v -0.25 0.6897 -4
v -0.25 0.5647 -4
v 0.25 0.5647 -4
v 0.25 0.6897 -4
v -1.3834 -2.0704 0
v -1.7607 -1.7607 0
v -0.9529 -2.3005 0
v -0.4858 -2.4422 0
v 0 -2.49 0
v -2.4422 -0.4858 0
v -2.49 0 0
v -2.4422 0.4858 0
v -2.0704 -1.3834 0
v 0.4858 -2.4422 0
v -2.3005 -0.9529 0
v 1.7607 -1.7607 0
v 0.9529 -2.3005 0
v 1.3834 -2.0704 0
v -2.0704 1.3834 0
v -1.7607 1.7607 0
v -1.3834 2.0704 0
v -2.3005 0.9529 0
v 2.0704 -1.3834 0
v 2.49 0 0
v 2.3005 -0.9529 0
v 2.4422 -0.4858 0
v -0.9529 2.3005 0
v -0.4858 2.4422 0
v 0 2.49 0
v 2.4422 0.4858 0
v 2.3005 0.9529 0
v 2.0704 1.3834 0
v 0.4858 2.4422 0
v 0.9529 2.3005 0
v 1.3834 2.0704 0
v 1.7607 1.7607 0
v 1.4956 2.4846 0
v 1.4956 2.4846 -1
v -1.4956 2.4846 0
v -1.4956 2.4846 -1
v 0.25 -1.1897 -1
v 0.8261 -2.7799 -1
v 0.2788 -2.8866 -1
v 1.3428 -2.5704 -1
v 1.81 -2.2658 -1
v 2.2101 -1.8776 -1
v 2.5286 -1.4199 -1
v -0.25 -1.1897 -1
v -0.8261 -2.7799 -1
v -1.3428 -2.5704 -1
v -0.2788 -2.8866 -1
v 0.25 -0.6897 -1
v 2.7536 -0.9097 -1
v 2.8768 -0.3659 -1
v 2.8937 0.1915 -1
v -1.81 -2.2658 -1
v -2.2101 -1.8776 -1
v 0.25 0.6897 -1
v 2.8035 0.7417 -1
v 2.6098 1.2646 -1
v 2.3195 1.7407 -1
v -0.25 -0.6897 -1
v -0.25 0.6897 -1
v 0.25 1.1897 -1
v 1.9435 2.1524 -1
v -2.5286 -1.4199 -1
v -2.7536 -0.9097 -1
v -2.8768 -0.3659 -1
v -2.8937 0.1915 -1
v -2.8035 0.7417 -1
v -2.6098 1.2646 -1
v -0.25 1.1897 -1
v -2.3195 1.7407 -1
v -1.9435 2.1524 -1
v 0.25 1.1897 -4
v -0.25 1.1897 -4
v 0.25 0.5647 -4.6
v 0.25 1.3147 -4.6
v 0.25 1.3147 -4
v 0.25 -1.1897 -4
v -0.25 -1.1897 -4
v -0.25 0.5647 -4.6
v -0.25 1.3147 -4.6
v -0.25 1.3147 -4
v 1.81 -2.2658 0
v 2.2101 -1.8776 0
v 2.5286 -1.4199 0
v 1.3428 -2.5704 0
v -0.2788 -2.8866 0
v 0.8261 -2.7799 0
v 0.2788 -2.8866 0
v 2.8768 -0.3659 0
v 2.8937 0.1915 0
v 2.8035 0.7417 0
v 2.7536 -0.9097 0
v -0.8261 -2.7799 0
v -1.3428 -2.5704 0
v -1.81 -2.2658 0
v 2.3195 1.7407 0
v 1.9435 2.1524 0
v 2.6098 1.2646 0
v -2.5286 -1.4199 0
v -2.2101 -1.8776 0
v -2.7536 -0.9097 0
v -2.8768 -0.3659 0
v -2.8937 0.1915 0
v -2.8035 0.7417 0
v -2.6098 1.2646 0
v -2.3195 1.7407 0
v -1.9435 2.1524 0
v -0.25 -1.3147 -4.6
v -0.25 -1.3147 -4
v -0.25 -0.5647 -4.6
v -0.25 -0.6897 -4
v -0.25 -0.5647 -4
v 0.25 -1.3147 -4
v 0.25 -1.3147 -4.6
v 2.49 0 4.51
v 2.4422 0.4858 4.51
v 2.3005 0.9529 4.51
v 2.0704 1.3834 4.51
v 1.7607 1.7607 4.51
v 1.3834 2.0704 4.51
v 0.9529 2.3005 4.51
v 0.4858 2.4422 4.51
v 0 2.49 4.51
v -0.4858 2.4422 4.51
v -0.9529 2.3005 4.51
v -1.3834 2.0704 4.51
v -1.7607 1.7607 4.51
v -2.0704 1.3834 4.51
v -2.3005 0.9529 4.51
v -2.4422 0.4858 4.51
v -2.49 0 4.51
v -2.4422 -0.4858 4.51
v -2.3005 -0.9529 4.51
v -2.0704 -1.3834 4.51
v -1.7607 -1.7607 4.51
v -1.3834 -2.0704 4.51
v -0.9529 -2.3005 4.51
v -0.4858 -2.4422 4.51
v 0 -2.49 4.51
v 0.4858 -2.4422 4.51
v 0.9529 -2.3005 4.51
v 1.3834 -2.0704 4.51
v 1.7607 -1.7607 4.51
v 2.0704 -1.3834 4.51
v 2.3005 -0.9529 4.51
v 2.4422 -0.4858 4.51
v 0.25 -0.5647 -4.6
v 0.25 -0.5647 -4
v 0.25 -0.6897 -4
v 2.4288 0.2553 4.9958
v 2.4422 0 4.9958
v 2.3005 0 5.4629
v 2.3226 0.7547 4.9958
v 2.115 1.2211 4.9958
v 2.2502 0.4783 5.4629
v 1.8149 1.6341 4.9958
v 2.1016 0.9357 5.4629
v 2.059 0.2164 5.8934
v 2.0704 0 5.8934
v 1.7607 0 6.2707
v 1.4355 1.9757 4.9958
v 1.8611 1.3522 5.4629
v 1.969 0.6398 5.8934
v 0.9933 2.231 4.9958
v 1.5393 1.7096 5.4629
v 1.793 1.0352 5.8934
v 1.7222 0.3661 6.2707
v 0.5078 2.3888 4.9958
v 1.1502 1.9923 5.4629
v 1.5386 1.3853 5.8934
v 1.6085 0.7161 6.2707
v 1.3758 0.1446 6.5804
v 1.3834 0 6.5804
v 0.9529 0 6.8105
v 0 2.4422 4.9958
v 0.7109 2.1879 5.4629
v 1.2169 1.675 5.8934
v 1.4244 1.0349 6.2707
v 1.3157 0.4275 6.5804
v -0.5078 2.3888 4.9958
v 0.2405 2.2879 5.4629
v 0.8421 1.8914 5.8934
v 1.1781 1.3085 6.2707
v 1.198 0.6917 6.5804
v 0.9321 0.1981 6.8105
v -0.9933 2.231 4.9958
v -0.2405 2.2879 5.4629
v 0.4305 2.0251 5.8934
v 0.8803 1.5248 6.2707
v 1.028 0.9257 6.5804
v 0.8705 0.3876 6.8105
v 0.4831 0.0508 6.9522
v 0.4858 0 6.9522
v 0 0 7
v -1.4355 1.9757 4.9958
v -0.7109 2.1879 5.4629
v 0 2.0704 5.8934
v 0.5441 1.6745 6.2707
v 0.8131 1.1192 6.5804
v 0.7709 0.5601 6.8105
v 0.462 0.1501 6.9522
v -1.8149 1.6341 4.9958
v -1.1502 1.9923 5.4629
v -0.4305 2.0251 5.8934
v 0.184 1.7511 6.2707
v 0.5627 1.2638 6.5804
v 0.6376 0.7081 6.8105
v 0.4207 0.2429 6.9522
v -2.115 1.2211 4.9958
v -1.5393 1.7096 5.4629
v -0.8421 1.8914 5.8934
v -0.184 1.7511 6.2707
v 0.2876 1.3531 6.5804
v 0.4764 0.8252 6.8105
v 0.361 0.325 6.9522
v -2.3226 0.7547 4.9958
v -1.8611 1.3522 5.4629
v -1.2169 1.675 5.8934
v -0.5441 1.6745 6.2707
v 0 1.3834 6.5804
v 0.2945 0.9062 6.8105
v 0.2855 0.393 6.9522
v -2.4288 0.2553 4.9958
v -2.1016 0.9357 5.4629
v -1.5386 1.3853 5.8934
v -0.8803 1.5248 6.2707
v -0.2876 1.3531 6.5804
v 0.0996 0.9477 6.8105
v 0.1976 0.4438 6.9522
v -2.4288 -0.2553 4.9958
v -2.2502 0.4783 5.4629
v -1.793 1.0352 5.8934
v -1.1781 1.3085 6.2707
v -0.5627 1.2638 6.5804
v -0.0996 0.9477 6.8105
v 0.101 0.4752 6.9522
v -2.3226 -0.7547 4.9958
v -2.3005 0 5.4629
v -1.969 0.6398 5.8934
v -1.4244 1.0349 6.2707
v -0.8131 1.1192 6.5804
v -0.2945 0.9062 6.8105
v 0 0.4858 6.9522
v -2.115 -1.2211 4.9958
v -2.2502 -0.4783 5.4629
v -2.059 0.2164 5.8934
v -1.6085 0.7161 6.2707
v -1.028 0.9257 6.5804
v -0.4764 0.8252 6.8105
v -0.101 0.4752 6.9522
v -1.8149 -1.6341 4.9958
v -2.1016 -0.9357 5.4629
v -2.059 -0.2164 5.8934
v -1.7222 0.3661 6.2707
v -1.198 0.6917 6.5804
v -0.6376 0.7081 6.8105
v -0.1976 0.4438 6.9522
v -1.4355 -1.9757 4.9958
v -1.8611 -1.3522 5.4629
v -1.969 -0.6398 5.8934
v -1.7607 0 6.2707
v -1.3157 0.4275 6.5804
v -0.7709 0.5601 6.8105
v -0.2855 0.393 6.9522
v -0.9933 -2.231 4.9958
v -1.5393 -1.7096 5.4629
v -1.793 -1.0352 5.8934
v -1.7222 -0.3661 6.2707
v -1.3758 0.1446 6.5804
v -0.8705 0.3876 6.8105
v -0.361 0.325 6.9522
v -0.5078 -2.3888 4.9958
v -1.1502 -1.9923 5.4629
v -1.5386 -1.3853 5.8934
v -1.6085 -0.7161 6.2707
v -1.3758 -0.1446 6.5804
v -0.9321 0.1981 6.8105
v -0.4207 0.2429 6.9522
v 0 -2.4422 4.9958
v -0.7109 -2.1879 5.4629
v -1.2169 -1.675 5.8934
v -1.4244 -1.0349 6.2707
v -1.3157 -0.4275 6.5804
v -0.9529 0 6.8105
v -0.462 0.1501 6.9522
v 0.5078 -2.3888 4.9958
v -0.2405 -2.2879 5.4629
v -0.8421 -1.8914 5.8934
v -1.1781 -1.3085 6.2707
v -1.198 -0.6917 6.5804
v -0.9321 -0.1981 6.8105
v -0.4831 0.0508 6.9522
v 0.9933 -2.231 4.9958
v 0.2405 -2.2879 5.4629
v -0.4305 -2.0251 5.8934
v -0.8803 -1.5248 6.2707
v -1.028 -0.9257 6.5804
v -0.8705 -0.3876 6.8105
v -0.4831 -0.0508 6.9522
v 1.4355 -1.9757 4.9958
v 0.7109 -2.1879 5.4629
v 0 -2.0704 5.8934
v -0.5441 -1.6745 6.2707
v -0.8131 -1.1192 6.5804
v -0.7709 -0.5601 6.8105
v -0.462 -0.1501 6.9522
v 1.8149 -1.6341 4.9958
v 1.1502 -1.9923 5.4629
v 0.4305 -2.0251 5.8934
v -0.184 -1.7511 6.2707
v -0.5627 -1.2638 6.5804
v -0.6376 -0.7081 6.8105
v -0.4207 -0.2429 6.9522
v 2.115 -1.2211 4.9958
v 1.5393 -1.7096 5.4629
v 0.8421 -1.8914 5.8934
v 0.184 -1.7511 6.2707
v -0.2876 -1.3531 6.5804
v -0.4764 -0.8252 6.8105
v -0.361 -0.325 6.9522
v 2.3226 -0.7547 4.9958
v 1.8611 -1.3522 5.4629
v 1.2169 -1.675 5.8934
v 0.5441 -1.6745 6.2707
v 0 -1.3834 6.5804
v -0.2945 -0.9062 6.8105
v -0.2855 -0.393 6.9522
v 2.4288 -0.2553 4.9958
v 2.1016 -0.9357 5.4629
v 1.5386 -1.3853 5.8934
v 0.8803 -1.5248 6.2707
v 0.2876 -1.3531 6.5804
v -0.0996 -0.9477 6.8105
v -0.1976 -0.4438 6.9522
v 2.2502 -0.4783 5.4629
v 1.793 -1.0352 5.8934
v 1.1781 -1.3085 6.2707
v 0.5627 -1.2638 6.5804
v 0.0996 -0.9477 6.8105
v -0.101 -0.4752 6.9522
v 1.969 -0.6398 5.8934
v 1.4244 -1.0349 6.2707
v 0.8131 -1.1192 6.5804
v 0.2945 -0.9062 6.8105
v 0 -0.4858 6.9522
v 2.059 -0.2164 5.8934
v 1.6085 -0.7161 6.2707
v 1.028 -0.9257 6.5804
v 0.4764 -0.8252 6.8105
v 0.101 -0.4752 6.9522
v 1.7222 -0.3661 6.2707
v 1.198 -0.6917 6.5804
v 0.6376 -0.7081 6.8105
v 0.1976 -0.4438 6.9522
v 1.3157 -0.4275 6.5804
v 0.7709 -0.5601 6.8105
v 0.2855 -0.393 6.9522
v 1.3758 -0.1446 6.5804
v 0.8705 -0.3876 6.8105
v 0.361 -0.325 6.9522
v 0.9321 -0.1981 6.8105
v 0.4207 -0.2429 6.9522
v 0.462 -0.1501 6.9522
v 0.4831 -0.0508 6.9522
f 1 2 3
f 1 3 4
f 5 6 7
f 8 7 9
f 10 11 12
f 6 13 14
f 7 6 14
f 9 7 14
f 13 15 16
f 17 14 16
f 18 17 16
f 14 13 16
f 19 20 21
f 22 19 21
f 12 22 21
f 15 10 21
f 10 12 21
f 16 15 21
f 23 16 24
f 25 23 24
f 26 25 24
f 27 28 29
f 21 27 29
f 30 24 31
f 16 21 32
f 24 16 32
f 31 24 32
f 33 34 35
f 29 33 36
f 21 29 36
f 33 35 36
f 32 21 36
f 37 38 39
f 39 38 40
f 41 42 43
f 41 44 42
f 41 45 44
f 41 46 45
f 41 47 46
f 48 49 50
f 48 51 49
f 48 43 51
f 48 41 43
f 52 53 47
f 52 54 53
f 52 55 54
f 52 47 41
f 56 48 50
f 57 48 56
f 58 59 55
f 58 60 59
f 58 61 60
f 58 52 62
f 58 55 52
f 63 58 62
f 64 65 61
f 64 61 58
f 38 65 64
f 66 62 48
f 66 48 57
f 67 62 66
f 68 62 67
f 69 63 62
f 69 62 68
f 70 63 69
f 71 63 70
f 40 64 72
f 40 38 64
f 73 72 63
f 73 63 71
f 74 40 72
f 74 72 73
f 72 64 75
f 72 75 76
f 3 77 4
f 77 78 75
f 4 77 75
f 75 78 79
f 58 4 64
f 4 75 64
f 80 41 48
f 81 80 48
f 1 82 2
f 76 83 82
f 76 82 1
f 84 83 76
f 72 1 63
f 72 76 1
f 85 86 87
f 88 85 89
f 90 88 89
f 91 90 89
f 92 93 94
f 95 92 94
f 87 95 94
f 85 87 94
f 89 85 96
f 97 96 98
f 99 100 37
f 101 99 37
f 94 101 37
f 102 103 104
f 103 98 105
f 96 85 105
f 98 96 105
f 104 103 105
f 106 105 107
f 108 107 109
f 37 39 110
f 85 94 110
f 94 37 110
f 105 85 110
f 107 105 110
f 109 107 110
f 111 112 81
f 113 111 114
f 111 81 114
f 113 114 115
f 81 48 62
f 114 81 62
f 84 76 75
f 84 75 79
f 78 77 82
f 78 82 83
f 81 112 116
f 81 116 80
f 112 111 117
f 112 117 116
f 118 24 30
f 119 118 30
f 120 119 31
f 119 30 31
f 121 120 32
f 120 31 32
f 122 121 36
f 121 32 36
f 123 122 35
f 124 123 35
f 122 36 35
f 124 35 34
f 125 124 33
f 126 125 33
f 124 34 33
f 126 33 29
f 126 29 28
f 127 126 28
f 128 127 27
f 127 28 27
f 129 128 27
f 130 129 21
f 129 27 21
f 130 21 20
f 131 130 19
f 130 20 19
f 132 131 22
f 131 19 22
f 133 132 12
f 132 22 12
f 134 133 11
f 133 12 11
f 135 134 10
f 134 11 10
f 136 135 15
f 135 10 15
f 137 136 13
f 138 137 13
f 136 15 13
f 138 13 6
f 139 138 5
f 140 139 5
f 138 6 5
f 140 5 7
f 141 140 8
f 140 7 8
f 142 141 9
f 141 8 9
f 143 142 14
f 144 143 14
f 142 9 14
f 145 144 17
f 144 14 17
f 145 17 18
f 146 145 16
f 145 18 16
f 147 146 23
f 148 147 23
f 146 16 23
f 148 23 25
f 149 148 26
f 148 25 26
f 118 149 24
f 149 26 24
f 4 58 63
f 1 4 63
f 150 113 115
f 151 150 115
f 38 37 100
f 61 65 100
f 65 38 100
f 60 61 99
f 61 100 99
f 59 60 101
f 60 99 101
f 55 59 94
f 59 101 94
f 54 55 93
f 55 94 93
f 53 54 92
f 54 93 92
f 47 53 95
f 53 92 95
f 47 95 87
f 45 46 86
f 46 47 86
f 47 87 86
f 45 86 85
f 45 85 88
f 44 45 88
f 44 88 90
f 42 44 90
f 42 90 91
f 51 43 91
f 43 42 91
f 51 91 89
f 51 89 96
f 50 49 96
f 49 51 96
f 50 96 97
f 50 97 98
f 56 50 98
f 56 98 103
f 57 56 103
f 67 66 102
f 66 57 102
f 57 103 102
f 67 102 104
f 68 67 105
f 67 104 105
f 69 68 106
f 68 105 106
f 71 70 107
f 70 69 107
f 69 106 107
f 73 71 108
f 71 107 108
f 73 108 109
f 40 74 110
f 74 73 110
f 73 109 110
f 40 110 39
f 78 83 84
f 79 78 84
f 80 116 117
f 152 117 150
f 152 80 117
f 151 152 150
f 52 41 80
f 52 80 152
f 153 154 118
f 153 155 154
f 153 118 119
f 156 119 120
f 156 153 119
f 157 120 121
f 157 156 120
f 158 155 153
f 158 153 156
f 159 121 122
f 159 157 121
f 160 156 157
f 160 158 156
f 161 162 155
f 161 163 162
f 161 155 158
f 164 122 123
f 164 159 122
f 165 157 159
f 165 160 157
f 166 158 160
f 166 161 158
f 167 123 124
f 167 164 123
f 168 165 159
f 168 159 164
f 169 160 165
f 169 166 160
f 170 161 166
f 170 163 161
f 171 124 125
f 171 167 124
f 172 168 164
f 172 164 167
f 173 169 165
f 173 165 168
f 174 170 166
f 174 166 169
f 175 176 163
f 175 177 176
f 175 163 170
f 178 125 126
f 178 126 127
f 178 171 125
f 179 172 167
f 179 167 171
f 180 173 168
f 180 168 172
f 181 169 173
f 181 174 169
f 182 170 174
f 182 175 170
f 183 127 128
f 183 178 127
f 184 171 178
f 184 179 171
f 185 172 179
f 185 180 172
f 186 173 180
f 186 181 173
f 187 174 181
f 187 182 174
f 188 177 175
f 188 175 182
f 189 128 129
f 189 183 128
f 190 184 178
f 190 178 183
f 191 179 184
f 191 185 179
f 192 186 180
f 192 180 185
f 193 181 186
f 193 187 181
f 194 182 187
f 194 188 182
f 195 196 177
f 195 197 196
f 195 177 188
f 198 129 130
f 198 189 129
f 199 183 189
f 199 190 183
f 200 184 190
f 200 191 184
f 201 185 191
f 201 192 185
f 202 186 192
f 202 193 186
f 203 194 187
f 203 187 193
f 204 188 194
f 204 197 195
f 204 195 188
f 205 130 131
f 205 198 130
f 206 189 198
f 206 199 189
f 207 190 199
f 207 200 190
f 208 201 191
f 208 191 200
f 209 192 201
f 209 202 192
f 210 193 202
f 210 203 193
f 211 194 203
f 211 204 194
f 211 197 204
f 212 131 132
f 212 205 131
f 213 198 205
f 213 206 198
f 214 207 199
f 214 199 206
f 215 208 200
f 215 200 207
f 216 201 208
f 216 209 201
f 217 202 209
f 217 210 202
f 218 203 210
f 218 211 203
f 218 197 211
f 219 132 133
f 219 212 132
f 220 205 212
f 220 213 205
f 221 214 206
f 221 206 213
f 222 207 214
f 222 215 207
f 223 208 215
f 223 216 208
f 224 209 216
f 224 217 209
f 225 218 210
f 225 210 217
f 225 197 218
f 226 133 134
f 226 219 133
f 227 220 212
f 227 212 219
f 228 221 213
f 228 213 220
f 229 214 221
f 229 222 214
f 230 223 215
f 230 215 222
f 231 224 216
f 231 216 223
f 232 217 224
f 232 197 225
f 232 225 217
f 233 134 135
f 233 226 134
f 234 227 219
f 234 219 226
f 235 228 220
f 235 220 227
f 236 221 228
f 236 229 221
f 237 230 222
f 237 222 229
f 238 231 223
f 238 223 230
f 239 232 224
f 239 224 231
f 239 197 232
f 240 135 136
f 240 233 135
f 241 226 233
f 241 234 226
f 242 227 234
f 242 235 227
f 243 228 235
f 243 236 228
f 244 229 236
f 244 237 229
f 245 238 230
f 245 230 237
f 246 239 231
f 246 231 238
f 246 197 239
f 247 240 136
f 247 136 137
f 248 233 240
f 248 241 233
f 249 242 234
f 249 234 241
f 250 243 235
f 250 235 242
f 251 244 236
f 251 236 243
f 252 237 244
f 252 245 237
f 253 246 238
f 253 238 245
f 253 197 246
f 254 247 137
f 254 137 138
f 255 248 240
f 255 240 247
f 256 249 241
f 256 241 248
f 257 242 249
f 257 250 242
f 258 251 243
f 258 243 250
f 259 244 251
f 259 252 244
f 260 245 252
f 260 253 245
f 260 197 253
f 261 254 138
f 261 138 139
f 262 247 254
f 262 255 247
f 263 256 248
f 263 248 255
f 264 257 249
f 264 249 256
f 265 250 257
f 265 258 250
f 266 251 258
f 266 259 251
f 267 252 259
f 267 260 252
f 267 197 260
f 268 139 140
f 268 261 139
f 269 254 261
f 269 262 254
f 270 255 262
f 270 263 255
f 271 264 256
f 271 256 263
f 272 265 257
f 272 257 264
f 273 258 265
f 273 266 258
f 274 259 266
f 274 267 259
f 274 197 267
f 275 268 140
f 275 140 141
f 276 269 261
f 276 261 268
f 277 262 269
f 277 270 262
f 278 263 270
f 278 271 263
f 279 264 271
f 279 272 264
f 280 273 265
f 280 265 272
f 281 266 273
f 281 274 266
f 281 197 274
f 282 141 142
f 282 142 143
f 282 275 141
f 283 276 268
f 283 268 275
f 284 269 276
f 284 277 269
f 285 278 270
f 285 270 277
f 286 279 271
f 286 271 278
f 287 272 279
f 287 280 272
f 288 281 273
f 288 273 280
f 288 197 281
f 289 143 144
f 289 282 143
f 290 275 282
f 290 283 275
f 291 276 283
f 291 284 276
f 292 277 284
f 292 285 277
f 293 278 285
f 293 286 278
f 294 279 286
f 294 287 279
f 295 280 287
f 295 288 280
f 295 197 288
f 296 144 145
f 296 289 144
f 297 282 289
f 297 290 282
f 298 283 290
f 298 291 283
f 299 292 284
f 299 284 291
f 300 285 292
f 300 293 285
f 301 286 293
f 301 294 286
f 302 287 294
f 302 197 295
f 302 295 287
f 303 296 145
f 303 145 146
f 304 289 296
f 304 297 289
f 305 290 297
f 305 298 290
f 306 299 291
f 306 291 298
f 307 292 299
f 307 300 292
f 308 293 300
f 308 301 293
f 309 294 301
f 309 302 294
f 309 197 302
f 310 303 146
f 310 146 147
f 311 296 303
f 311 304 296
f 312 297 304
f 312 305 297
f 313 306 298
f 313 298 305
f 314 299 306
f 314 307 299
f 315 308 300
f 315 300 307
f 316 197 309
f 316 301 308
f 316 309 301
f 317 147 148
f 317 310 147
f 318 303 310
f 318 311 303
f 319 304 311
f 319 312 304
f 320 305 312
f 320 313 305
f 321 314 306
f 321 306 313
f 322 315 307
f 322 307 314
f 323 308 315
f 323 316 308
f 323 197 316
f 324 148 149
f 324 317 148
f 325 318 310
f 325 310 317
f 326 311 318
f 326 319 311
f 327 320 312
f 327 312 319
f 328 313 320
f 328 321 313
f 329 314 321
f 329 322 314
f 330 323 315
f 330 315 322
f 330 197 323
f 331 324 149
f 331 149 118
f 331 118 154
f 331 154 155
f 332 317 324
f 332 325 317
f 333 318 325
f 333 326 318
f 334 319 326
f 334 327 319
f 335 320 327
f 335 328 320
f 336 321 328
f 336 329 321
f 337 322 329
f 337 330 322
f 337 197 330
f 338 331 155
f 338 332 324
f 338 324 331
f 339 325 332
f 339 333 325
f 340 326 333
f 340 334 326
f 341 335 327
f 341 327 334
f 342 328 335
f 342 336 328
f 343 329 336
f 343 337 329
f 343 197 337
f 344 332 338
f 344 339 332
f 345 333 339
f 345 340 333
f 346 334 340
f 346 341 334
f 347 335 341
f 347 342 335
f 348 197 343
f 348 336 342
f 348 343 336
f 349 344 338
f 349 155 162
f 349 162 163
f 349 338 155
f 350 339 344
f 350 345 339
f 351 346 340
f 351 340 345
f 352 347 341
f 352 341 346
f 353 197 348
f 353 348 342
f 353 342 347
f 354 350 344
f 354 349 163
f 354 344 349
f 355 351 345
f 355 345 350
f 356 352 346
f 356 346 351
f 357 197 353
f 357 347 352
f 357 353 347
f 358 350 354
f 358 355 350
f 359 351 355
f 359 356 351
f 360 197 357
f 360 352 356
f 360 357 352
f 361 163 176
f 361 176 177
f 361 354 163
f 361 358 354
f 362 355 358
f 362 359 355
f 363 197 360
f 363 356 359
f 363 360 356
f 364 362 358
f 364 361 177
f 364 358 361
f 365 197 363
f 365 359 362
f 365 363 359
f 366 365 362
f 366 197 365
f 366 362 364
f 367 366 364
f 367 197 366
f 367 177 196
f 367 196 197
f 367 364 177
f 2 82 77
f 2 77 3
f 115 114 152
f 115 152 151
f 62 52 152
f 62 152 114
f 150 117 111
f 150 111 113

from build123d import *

# Parameters (mm, degrees)
SKETCH1_R           = 2.49
EXTRUDE1_DEPTH      = 7
FILLET2_R           = 2.49
SKETCH2_R           = 2.9
EXTRUDE2_DEPTH      = 1
SKETCH3_W           = 3.764524328
SKETCH3_H           = 0.567574437
CUT_EXTRUDE3_DEPTH  = 1
SKETCH5_W           = 0.5
SKETCH5_H           = 0.5
EXTRUS_O1_DEPTH     = 28
SKETCH5_3_W         = 0.5
SKETCH5_3_H         = 0.5
EXTRUS_O2_DEPTH     = 25.4
ESBO_O1_W           = 1.5
ESBO_O1_H           = 0.75
EXTRUS_O3_DEPTH     = 0.5
SKETCH_1_W          = 24.4
SKETCH_1_H          = 5.384586057
CUT_EXTRUDE_4_DEPTH = 10


with BuildPart() as part:
    # Sketch1 → Extrude1 (new body)
    with BuildSketch(Plane.XY):
        Circle(SKETCH1_R)
    extrude(amount=EXTRUDE1_DEPTH)

    # Fillet2
    fillet2_edges = [part.edges().sort_by_distance(p)[0] for p in [
        (-2.49, 0, 7),
    ]]
    fillet(fillet2_edges, radius=FILLET2_R)


with BuildPart() as body_2:
    # Sketch2 → Extrude2 (new body)
    with BuildSketch(Plane(origin=(0, 0, 0), x_dir=(-1, 0, 0), z_dir=(0, 0, -1))):
        Circle(SKETCH2_R)
    extrude(amount=EXTRUDE2_DEPTH)

    # Sketch3 → Cut-Extrude3 (cut)
    with BuildSketch(Plane(origin=(0, 0, -1), x_dir=(-1, 0, 0), z_dir=(0, 0, -1))):
        with Locations((-0.09845679, 2.768373276)):
            Rectangle(SKETCH3_W, SKETCH3_H)
    extrude(amount=-CUT_EXTRUDE3_DEPTH, mode=Mode.SUBTRACT)

    # Sketch5 → Extrusão1 (add)
    with BuildSketch(Plane(origin=(0, 0, -1), x_dir=(-1, 0, 0), z_dir=(0, 0, -1))):
        with Locations((0, -0.9397033)):
            Rectangle(SKETCH5_W, SKETCH5_H)
    extrude(amount=EXTRUS_O1_DEPTH)

    # Sketch5<3> → Extrusão2 (add)
    with BuildSketch(Plane(origin=(0, 0, -1), x_dir=(-1, 0, 0), z_dir=(0, 0, -1))):
        with Locations((0, 0.9397033)):
            Rectangle(SKETCH5_3_W, SKETCH5_3_H)
    extrude(amount=EXTRUS_O2_DEPTH)

    # Esboço1 → Extrusão3 (add)
    with BuildSketch(Plane.ZY.offset(0.25)):
        with Locations((-4.75, 0.9397033)):
            Rectangle(ESBO_O1_W, ESBO_O1_H)
        with Locations((-4.75, -0.9397033)):
            Rectangle(ESBO_O1_W, ESBO_O1_H)
    extrude(amount=-EXTRUS_O3_DEPTH)

    # ｽｹｯﾁ1 → ｶｯﾄ - 押し出し4 (cut)
    with BuildSketch(Plane(origin=(0.25, 0, 0), x_dir=(0, 0, -1), z_dir=(1, 0, 0))):
        with Locations((16.8, -0.207706972)):
            Rectangle(SKETCH_1_W, SKETCH_1_H)
    extrude(amount=-CUT_EXTRUDE_4_DEPTH, mode=Mode.SUBTRACT)


solid = Compound([part.part, body_2.part])
